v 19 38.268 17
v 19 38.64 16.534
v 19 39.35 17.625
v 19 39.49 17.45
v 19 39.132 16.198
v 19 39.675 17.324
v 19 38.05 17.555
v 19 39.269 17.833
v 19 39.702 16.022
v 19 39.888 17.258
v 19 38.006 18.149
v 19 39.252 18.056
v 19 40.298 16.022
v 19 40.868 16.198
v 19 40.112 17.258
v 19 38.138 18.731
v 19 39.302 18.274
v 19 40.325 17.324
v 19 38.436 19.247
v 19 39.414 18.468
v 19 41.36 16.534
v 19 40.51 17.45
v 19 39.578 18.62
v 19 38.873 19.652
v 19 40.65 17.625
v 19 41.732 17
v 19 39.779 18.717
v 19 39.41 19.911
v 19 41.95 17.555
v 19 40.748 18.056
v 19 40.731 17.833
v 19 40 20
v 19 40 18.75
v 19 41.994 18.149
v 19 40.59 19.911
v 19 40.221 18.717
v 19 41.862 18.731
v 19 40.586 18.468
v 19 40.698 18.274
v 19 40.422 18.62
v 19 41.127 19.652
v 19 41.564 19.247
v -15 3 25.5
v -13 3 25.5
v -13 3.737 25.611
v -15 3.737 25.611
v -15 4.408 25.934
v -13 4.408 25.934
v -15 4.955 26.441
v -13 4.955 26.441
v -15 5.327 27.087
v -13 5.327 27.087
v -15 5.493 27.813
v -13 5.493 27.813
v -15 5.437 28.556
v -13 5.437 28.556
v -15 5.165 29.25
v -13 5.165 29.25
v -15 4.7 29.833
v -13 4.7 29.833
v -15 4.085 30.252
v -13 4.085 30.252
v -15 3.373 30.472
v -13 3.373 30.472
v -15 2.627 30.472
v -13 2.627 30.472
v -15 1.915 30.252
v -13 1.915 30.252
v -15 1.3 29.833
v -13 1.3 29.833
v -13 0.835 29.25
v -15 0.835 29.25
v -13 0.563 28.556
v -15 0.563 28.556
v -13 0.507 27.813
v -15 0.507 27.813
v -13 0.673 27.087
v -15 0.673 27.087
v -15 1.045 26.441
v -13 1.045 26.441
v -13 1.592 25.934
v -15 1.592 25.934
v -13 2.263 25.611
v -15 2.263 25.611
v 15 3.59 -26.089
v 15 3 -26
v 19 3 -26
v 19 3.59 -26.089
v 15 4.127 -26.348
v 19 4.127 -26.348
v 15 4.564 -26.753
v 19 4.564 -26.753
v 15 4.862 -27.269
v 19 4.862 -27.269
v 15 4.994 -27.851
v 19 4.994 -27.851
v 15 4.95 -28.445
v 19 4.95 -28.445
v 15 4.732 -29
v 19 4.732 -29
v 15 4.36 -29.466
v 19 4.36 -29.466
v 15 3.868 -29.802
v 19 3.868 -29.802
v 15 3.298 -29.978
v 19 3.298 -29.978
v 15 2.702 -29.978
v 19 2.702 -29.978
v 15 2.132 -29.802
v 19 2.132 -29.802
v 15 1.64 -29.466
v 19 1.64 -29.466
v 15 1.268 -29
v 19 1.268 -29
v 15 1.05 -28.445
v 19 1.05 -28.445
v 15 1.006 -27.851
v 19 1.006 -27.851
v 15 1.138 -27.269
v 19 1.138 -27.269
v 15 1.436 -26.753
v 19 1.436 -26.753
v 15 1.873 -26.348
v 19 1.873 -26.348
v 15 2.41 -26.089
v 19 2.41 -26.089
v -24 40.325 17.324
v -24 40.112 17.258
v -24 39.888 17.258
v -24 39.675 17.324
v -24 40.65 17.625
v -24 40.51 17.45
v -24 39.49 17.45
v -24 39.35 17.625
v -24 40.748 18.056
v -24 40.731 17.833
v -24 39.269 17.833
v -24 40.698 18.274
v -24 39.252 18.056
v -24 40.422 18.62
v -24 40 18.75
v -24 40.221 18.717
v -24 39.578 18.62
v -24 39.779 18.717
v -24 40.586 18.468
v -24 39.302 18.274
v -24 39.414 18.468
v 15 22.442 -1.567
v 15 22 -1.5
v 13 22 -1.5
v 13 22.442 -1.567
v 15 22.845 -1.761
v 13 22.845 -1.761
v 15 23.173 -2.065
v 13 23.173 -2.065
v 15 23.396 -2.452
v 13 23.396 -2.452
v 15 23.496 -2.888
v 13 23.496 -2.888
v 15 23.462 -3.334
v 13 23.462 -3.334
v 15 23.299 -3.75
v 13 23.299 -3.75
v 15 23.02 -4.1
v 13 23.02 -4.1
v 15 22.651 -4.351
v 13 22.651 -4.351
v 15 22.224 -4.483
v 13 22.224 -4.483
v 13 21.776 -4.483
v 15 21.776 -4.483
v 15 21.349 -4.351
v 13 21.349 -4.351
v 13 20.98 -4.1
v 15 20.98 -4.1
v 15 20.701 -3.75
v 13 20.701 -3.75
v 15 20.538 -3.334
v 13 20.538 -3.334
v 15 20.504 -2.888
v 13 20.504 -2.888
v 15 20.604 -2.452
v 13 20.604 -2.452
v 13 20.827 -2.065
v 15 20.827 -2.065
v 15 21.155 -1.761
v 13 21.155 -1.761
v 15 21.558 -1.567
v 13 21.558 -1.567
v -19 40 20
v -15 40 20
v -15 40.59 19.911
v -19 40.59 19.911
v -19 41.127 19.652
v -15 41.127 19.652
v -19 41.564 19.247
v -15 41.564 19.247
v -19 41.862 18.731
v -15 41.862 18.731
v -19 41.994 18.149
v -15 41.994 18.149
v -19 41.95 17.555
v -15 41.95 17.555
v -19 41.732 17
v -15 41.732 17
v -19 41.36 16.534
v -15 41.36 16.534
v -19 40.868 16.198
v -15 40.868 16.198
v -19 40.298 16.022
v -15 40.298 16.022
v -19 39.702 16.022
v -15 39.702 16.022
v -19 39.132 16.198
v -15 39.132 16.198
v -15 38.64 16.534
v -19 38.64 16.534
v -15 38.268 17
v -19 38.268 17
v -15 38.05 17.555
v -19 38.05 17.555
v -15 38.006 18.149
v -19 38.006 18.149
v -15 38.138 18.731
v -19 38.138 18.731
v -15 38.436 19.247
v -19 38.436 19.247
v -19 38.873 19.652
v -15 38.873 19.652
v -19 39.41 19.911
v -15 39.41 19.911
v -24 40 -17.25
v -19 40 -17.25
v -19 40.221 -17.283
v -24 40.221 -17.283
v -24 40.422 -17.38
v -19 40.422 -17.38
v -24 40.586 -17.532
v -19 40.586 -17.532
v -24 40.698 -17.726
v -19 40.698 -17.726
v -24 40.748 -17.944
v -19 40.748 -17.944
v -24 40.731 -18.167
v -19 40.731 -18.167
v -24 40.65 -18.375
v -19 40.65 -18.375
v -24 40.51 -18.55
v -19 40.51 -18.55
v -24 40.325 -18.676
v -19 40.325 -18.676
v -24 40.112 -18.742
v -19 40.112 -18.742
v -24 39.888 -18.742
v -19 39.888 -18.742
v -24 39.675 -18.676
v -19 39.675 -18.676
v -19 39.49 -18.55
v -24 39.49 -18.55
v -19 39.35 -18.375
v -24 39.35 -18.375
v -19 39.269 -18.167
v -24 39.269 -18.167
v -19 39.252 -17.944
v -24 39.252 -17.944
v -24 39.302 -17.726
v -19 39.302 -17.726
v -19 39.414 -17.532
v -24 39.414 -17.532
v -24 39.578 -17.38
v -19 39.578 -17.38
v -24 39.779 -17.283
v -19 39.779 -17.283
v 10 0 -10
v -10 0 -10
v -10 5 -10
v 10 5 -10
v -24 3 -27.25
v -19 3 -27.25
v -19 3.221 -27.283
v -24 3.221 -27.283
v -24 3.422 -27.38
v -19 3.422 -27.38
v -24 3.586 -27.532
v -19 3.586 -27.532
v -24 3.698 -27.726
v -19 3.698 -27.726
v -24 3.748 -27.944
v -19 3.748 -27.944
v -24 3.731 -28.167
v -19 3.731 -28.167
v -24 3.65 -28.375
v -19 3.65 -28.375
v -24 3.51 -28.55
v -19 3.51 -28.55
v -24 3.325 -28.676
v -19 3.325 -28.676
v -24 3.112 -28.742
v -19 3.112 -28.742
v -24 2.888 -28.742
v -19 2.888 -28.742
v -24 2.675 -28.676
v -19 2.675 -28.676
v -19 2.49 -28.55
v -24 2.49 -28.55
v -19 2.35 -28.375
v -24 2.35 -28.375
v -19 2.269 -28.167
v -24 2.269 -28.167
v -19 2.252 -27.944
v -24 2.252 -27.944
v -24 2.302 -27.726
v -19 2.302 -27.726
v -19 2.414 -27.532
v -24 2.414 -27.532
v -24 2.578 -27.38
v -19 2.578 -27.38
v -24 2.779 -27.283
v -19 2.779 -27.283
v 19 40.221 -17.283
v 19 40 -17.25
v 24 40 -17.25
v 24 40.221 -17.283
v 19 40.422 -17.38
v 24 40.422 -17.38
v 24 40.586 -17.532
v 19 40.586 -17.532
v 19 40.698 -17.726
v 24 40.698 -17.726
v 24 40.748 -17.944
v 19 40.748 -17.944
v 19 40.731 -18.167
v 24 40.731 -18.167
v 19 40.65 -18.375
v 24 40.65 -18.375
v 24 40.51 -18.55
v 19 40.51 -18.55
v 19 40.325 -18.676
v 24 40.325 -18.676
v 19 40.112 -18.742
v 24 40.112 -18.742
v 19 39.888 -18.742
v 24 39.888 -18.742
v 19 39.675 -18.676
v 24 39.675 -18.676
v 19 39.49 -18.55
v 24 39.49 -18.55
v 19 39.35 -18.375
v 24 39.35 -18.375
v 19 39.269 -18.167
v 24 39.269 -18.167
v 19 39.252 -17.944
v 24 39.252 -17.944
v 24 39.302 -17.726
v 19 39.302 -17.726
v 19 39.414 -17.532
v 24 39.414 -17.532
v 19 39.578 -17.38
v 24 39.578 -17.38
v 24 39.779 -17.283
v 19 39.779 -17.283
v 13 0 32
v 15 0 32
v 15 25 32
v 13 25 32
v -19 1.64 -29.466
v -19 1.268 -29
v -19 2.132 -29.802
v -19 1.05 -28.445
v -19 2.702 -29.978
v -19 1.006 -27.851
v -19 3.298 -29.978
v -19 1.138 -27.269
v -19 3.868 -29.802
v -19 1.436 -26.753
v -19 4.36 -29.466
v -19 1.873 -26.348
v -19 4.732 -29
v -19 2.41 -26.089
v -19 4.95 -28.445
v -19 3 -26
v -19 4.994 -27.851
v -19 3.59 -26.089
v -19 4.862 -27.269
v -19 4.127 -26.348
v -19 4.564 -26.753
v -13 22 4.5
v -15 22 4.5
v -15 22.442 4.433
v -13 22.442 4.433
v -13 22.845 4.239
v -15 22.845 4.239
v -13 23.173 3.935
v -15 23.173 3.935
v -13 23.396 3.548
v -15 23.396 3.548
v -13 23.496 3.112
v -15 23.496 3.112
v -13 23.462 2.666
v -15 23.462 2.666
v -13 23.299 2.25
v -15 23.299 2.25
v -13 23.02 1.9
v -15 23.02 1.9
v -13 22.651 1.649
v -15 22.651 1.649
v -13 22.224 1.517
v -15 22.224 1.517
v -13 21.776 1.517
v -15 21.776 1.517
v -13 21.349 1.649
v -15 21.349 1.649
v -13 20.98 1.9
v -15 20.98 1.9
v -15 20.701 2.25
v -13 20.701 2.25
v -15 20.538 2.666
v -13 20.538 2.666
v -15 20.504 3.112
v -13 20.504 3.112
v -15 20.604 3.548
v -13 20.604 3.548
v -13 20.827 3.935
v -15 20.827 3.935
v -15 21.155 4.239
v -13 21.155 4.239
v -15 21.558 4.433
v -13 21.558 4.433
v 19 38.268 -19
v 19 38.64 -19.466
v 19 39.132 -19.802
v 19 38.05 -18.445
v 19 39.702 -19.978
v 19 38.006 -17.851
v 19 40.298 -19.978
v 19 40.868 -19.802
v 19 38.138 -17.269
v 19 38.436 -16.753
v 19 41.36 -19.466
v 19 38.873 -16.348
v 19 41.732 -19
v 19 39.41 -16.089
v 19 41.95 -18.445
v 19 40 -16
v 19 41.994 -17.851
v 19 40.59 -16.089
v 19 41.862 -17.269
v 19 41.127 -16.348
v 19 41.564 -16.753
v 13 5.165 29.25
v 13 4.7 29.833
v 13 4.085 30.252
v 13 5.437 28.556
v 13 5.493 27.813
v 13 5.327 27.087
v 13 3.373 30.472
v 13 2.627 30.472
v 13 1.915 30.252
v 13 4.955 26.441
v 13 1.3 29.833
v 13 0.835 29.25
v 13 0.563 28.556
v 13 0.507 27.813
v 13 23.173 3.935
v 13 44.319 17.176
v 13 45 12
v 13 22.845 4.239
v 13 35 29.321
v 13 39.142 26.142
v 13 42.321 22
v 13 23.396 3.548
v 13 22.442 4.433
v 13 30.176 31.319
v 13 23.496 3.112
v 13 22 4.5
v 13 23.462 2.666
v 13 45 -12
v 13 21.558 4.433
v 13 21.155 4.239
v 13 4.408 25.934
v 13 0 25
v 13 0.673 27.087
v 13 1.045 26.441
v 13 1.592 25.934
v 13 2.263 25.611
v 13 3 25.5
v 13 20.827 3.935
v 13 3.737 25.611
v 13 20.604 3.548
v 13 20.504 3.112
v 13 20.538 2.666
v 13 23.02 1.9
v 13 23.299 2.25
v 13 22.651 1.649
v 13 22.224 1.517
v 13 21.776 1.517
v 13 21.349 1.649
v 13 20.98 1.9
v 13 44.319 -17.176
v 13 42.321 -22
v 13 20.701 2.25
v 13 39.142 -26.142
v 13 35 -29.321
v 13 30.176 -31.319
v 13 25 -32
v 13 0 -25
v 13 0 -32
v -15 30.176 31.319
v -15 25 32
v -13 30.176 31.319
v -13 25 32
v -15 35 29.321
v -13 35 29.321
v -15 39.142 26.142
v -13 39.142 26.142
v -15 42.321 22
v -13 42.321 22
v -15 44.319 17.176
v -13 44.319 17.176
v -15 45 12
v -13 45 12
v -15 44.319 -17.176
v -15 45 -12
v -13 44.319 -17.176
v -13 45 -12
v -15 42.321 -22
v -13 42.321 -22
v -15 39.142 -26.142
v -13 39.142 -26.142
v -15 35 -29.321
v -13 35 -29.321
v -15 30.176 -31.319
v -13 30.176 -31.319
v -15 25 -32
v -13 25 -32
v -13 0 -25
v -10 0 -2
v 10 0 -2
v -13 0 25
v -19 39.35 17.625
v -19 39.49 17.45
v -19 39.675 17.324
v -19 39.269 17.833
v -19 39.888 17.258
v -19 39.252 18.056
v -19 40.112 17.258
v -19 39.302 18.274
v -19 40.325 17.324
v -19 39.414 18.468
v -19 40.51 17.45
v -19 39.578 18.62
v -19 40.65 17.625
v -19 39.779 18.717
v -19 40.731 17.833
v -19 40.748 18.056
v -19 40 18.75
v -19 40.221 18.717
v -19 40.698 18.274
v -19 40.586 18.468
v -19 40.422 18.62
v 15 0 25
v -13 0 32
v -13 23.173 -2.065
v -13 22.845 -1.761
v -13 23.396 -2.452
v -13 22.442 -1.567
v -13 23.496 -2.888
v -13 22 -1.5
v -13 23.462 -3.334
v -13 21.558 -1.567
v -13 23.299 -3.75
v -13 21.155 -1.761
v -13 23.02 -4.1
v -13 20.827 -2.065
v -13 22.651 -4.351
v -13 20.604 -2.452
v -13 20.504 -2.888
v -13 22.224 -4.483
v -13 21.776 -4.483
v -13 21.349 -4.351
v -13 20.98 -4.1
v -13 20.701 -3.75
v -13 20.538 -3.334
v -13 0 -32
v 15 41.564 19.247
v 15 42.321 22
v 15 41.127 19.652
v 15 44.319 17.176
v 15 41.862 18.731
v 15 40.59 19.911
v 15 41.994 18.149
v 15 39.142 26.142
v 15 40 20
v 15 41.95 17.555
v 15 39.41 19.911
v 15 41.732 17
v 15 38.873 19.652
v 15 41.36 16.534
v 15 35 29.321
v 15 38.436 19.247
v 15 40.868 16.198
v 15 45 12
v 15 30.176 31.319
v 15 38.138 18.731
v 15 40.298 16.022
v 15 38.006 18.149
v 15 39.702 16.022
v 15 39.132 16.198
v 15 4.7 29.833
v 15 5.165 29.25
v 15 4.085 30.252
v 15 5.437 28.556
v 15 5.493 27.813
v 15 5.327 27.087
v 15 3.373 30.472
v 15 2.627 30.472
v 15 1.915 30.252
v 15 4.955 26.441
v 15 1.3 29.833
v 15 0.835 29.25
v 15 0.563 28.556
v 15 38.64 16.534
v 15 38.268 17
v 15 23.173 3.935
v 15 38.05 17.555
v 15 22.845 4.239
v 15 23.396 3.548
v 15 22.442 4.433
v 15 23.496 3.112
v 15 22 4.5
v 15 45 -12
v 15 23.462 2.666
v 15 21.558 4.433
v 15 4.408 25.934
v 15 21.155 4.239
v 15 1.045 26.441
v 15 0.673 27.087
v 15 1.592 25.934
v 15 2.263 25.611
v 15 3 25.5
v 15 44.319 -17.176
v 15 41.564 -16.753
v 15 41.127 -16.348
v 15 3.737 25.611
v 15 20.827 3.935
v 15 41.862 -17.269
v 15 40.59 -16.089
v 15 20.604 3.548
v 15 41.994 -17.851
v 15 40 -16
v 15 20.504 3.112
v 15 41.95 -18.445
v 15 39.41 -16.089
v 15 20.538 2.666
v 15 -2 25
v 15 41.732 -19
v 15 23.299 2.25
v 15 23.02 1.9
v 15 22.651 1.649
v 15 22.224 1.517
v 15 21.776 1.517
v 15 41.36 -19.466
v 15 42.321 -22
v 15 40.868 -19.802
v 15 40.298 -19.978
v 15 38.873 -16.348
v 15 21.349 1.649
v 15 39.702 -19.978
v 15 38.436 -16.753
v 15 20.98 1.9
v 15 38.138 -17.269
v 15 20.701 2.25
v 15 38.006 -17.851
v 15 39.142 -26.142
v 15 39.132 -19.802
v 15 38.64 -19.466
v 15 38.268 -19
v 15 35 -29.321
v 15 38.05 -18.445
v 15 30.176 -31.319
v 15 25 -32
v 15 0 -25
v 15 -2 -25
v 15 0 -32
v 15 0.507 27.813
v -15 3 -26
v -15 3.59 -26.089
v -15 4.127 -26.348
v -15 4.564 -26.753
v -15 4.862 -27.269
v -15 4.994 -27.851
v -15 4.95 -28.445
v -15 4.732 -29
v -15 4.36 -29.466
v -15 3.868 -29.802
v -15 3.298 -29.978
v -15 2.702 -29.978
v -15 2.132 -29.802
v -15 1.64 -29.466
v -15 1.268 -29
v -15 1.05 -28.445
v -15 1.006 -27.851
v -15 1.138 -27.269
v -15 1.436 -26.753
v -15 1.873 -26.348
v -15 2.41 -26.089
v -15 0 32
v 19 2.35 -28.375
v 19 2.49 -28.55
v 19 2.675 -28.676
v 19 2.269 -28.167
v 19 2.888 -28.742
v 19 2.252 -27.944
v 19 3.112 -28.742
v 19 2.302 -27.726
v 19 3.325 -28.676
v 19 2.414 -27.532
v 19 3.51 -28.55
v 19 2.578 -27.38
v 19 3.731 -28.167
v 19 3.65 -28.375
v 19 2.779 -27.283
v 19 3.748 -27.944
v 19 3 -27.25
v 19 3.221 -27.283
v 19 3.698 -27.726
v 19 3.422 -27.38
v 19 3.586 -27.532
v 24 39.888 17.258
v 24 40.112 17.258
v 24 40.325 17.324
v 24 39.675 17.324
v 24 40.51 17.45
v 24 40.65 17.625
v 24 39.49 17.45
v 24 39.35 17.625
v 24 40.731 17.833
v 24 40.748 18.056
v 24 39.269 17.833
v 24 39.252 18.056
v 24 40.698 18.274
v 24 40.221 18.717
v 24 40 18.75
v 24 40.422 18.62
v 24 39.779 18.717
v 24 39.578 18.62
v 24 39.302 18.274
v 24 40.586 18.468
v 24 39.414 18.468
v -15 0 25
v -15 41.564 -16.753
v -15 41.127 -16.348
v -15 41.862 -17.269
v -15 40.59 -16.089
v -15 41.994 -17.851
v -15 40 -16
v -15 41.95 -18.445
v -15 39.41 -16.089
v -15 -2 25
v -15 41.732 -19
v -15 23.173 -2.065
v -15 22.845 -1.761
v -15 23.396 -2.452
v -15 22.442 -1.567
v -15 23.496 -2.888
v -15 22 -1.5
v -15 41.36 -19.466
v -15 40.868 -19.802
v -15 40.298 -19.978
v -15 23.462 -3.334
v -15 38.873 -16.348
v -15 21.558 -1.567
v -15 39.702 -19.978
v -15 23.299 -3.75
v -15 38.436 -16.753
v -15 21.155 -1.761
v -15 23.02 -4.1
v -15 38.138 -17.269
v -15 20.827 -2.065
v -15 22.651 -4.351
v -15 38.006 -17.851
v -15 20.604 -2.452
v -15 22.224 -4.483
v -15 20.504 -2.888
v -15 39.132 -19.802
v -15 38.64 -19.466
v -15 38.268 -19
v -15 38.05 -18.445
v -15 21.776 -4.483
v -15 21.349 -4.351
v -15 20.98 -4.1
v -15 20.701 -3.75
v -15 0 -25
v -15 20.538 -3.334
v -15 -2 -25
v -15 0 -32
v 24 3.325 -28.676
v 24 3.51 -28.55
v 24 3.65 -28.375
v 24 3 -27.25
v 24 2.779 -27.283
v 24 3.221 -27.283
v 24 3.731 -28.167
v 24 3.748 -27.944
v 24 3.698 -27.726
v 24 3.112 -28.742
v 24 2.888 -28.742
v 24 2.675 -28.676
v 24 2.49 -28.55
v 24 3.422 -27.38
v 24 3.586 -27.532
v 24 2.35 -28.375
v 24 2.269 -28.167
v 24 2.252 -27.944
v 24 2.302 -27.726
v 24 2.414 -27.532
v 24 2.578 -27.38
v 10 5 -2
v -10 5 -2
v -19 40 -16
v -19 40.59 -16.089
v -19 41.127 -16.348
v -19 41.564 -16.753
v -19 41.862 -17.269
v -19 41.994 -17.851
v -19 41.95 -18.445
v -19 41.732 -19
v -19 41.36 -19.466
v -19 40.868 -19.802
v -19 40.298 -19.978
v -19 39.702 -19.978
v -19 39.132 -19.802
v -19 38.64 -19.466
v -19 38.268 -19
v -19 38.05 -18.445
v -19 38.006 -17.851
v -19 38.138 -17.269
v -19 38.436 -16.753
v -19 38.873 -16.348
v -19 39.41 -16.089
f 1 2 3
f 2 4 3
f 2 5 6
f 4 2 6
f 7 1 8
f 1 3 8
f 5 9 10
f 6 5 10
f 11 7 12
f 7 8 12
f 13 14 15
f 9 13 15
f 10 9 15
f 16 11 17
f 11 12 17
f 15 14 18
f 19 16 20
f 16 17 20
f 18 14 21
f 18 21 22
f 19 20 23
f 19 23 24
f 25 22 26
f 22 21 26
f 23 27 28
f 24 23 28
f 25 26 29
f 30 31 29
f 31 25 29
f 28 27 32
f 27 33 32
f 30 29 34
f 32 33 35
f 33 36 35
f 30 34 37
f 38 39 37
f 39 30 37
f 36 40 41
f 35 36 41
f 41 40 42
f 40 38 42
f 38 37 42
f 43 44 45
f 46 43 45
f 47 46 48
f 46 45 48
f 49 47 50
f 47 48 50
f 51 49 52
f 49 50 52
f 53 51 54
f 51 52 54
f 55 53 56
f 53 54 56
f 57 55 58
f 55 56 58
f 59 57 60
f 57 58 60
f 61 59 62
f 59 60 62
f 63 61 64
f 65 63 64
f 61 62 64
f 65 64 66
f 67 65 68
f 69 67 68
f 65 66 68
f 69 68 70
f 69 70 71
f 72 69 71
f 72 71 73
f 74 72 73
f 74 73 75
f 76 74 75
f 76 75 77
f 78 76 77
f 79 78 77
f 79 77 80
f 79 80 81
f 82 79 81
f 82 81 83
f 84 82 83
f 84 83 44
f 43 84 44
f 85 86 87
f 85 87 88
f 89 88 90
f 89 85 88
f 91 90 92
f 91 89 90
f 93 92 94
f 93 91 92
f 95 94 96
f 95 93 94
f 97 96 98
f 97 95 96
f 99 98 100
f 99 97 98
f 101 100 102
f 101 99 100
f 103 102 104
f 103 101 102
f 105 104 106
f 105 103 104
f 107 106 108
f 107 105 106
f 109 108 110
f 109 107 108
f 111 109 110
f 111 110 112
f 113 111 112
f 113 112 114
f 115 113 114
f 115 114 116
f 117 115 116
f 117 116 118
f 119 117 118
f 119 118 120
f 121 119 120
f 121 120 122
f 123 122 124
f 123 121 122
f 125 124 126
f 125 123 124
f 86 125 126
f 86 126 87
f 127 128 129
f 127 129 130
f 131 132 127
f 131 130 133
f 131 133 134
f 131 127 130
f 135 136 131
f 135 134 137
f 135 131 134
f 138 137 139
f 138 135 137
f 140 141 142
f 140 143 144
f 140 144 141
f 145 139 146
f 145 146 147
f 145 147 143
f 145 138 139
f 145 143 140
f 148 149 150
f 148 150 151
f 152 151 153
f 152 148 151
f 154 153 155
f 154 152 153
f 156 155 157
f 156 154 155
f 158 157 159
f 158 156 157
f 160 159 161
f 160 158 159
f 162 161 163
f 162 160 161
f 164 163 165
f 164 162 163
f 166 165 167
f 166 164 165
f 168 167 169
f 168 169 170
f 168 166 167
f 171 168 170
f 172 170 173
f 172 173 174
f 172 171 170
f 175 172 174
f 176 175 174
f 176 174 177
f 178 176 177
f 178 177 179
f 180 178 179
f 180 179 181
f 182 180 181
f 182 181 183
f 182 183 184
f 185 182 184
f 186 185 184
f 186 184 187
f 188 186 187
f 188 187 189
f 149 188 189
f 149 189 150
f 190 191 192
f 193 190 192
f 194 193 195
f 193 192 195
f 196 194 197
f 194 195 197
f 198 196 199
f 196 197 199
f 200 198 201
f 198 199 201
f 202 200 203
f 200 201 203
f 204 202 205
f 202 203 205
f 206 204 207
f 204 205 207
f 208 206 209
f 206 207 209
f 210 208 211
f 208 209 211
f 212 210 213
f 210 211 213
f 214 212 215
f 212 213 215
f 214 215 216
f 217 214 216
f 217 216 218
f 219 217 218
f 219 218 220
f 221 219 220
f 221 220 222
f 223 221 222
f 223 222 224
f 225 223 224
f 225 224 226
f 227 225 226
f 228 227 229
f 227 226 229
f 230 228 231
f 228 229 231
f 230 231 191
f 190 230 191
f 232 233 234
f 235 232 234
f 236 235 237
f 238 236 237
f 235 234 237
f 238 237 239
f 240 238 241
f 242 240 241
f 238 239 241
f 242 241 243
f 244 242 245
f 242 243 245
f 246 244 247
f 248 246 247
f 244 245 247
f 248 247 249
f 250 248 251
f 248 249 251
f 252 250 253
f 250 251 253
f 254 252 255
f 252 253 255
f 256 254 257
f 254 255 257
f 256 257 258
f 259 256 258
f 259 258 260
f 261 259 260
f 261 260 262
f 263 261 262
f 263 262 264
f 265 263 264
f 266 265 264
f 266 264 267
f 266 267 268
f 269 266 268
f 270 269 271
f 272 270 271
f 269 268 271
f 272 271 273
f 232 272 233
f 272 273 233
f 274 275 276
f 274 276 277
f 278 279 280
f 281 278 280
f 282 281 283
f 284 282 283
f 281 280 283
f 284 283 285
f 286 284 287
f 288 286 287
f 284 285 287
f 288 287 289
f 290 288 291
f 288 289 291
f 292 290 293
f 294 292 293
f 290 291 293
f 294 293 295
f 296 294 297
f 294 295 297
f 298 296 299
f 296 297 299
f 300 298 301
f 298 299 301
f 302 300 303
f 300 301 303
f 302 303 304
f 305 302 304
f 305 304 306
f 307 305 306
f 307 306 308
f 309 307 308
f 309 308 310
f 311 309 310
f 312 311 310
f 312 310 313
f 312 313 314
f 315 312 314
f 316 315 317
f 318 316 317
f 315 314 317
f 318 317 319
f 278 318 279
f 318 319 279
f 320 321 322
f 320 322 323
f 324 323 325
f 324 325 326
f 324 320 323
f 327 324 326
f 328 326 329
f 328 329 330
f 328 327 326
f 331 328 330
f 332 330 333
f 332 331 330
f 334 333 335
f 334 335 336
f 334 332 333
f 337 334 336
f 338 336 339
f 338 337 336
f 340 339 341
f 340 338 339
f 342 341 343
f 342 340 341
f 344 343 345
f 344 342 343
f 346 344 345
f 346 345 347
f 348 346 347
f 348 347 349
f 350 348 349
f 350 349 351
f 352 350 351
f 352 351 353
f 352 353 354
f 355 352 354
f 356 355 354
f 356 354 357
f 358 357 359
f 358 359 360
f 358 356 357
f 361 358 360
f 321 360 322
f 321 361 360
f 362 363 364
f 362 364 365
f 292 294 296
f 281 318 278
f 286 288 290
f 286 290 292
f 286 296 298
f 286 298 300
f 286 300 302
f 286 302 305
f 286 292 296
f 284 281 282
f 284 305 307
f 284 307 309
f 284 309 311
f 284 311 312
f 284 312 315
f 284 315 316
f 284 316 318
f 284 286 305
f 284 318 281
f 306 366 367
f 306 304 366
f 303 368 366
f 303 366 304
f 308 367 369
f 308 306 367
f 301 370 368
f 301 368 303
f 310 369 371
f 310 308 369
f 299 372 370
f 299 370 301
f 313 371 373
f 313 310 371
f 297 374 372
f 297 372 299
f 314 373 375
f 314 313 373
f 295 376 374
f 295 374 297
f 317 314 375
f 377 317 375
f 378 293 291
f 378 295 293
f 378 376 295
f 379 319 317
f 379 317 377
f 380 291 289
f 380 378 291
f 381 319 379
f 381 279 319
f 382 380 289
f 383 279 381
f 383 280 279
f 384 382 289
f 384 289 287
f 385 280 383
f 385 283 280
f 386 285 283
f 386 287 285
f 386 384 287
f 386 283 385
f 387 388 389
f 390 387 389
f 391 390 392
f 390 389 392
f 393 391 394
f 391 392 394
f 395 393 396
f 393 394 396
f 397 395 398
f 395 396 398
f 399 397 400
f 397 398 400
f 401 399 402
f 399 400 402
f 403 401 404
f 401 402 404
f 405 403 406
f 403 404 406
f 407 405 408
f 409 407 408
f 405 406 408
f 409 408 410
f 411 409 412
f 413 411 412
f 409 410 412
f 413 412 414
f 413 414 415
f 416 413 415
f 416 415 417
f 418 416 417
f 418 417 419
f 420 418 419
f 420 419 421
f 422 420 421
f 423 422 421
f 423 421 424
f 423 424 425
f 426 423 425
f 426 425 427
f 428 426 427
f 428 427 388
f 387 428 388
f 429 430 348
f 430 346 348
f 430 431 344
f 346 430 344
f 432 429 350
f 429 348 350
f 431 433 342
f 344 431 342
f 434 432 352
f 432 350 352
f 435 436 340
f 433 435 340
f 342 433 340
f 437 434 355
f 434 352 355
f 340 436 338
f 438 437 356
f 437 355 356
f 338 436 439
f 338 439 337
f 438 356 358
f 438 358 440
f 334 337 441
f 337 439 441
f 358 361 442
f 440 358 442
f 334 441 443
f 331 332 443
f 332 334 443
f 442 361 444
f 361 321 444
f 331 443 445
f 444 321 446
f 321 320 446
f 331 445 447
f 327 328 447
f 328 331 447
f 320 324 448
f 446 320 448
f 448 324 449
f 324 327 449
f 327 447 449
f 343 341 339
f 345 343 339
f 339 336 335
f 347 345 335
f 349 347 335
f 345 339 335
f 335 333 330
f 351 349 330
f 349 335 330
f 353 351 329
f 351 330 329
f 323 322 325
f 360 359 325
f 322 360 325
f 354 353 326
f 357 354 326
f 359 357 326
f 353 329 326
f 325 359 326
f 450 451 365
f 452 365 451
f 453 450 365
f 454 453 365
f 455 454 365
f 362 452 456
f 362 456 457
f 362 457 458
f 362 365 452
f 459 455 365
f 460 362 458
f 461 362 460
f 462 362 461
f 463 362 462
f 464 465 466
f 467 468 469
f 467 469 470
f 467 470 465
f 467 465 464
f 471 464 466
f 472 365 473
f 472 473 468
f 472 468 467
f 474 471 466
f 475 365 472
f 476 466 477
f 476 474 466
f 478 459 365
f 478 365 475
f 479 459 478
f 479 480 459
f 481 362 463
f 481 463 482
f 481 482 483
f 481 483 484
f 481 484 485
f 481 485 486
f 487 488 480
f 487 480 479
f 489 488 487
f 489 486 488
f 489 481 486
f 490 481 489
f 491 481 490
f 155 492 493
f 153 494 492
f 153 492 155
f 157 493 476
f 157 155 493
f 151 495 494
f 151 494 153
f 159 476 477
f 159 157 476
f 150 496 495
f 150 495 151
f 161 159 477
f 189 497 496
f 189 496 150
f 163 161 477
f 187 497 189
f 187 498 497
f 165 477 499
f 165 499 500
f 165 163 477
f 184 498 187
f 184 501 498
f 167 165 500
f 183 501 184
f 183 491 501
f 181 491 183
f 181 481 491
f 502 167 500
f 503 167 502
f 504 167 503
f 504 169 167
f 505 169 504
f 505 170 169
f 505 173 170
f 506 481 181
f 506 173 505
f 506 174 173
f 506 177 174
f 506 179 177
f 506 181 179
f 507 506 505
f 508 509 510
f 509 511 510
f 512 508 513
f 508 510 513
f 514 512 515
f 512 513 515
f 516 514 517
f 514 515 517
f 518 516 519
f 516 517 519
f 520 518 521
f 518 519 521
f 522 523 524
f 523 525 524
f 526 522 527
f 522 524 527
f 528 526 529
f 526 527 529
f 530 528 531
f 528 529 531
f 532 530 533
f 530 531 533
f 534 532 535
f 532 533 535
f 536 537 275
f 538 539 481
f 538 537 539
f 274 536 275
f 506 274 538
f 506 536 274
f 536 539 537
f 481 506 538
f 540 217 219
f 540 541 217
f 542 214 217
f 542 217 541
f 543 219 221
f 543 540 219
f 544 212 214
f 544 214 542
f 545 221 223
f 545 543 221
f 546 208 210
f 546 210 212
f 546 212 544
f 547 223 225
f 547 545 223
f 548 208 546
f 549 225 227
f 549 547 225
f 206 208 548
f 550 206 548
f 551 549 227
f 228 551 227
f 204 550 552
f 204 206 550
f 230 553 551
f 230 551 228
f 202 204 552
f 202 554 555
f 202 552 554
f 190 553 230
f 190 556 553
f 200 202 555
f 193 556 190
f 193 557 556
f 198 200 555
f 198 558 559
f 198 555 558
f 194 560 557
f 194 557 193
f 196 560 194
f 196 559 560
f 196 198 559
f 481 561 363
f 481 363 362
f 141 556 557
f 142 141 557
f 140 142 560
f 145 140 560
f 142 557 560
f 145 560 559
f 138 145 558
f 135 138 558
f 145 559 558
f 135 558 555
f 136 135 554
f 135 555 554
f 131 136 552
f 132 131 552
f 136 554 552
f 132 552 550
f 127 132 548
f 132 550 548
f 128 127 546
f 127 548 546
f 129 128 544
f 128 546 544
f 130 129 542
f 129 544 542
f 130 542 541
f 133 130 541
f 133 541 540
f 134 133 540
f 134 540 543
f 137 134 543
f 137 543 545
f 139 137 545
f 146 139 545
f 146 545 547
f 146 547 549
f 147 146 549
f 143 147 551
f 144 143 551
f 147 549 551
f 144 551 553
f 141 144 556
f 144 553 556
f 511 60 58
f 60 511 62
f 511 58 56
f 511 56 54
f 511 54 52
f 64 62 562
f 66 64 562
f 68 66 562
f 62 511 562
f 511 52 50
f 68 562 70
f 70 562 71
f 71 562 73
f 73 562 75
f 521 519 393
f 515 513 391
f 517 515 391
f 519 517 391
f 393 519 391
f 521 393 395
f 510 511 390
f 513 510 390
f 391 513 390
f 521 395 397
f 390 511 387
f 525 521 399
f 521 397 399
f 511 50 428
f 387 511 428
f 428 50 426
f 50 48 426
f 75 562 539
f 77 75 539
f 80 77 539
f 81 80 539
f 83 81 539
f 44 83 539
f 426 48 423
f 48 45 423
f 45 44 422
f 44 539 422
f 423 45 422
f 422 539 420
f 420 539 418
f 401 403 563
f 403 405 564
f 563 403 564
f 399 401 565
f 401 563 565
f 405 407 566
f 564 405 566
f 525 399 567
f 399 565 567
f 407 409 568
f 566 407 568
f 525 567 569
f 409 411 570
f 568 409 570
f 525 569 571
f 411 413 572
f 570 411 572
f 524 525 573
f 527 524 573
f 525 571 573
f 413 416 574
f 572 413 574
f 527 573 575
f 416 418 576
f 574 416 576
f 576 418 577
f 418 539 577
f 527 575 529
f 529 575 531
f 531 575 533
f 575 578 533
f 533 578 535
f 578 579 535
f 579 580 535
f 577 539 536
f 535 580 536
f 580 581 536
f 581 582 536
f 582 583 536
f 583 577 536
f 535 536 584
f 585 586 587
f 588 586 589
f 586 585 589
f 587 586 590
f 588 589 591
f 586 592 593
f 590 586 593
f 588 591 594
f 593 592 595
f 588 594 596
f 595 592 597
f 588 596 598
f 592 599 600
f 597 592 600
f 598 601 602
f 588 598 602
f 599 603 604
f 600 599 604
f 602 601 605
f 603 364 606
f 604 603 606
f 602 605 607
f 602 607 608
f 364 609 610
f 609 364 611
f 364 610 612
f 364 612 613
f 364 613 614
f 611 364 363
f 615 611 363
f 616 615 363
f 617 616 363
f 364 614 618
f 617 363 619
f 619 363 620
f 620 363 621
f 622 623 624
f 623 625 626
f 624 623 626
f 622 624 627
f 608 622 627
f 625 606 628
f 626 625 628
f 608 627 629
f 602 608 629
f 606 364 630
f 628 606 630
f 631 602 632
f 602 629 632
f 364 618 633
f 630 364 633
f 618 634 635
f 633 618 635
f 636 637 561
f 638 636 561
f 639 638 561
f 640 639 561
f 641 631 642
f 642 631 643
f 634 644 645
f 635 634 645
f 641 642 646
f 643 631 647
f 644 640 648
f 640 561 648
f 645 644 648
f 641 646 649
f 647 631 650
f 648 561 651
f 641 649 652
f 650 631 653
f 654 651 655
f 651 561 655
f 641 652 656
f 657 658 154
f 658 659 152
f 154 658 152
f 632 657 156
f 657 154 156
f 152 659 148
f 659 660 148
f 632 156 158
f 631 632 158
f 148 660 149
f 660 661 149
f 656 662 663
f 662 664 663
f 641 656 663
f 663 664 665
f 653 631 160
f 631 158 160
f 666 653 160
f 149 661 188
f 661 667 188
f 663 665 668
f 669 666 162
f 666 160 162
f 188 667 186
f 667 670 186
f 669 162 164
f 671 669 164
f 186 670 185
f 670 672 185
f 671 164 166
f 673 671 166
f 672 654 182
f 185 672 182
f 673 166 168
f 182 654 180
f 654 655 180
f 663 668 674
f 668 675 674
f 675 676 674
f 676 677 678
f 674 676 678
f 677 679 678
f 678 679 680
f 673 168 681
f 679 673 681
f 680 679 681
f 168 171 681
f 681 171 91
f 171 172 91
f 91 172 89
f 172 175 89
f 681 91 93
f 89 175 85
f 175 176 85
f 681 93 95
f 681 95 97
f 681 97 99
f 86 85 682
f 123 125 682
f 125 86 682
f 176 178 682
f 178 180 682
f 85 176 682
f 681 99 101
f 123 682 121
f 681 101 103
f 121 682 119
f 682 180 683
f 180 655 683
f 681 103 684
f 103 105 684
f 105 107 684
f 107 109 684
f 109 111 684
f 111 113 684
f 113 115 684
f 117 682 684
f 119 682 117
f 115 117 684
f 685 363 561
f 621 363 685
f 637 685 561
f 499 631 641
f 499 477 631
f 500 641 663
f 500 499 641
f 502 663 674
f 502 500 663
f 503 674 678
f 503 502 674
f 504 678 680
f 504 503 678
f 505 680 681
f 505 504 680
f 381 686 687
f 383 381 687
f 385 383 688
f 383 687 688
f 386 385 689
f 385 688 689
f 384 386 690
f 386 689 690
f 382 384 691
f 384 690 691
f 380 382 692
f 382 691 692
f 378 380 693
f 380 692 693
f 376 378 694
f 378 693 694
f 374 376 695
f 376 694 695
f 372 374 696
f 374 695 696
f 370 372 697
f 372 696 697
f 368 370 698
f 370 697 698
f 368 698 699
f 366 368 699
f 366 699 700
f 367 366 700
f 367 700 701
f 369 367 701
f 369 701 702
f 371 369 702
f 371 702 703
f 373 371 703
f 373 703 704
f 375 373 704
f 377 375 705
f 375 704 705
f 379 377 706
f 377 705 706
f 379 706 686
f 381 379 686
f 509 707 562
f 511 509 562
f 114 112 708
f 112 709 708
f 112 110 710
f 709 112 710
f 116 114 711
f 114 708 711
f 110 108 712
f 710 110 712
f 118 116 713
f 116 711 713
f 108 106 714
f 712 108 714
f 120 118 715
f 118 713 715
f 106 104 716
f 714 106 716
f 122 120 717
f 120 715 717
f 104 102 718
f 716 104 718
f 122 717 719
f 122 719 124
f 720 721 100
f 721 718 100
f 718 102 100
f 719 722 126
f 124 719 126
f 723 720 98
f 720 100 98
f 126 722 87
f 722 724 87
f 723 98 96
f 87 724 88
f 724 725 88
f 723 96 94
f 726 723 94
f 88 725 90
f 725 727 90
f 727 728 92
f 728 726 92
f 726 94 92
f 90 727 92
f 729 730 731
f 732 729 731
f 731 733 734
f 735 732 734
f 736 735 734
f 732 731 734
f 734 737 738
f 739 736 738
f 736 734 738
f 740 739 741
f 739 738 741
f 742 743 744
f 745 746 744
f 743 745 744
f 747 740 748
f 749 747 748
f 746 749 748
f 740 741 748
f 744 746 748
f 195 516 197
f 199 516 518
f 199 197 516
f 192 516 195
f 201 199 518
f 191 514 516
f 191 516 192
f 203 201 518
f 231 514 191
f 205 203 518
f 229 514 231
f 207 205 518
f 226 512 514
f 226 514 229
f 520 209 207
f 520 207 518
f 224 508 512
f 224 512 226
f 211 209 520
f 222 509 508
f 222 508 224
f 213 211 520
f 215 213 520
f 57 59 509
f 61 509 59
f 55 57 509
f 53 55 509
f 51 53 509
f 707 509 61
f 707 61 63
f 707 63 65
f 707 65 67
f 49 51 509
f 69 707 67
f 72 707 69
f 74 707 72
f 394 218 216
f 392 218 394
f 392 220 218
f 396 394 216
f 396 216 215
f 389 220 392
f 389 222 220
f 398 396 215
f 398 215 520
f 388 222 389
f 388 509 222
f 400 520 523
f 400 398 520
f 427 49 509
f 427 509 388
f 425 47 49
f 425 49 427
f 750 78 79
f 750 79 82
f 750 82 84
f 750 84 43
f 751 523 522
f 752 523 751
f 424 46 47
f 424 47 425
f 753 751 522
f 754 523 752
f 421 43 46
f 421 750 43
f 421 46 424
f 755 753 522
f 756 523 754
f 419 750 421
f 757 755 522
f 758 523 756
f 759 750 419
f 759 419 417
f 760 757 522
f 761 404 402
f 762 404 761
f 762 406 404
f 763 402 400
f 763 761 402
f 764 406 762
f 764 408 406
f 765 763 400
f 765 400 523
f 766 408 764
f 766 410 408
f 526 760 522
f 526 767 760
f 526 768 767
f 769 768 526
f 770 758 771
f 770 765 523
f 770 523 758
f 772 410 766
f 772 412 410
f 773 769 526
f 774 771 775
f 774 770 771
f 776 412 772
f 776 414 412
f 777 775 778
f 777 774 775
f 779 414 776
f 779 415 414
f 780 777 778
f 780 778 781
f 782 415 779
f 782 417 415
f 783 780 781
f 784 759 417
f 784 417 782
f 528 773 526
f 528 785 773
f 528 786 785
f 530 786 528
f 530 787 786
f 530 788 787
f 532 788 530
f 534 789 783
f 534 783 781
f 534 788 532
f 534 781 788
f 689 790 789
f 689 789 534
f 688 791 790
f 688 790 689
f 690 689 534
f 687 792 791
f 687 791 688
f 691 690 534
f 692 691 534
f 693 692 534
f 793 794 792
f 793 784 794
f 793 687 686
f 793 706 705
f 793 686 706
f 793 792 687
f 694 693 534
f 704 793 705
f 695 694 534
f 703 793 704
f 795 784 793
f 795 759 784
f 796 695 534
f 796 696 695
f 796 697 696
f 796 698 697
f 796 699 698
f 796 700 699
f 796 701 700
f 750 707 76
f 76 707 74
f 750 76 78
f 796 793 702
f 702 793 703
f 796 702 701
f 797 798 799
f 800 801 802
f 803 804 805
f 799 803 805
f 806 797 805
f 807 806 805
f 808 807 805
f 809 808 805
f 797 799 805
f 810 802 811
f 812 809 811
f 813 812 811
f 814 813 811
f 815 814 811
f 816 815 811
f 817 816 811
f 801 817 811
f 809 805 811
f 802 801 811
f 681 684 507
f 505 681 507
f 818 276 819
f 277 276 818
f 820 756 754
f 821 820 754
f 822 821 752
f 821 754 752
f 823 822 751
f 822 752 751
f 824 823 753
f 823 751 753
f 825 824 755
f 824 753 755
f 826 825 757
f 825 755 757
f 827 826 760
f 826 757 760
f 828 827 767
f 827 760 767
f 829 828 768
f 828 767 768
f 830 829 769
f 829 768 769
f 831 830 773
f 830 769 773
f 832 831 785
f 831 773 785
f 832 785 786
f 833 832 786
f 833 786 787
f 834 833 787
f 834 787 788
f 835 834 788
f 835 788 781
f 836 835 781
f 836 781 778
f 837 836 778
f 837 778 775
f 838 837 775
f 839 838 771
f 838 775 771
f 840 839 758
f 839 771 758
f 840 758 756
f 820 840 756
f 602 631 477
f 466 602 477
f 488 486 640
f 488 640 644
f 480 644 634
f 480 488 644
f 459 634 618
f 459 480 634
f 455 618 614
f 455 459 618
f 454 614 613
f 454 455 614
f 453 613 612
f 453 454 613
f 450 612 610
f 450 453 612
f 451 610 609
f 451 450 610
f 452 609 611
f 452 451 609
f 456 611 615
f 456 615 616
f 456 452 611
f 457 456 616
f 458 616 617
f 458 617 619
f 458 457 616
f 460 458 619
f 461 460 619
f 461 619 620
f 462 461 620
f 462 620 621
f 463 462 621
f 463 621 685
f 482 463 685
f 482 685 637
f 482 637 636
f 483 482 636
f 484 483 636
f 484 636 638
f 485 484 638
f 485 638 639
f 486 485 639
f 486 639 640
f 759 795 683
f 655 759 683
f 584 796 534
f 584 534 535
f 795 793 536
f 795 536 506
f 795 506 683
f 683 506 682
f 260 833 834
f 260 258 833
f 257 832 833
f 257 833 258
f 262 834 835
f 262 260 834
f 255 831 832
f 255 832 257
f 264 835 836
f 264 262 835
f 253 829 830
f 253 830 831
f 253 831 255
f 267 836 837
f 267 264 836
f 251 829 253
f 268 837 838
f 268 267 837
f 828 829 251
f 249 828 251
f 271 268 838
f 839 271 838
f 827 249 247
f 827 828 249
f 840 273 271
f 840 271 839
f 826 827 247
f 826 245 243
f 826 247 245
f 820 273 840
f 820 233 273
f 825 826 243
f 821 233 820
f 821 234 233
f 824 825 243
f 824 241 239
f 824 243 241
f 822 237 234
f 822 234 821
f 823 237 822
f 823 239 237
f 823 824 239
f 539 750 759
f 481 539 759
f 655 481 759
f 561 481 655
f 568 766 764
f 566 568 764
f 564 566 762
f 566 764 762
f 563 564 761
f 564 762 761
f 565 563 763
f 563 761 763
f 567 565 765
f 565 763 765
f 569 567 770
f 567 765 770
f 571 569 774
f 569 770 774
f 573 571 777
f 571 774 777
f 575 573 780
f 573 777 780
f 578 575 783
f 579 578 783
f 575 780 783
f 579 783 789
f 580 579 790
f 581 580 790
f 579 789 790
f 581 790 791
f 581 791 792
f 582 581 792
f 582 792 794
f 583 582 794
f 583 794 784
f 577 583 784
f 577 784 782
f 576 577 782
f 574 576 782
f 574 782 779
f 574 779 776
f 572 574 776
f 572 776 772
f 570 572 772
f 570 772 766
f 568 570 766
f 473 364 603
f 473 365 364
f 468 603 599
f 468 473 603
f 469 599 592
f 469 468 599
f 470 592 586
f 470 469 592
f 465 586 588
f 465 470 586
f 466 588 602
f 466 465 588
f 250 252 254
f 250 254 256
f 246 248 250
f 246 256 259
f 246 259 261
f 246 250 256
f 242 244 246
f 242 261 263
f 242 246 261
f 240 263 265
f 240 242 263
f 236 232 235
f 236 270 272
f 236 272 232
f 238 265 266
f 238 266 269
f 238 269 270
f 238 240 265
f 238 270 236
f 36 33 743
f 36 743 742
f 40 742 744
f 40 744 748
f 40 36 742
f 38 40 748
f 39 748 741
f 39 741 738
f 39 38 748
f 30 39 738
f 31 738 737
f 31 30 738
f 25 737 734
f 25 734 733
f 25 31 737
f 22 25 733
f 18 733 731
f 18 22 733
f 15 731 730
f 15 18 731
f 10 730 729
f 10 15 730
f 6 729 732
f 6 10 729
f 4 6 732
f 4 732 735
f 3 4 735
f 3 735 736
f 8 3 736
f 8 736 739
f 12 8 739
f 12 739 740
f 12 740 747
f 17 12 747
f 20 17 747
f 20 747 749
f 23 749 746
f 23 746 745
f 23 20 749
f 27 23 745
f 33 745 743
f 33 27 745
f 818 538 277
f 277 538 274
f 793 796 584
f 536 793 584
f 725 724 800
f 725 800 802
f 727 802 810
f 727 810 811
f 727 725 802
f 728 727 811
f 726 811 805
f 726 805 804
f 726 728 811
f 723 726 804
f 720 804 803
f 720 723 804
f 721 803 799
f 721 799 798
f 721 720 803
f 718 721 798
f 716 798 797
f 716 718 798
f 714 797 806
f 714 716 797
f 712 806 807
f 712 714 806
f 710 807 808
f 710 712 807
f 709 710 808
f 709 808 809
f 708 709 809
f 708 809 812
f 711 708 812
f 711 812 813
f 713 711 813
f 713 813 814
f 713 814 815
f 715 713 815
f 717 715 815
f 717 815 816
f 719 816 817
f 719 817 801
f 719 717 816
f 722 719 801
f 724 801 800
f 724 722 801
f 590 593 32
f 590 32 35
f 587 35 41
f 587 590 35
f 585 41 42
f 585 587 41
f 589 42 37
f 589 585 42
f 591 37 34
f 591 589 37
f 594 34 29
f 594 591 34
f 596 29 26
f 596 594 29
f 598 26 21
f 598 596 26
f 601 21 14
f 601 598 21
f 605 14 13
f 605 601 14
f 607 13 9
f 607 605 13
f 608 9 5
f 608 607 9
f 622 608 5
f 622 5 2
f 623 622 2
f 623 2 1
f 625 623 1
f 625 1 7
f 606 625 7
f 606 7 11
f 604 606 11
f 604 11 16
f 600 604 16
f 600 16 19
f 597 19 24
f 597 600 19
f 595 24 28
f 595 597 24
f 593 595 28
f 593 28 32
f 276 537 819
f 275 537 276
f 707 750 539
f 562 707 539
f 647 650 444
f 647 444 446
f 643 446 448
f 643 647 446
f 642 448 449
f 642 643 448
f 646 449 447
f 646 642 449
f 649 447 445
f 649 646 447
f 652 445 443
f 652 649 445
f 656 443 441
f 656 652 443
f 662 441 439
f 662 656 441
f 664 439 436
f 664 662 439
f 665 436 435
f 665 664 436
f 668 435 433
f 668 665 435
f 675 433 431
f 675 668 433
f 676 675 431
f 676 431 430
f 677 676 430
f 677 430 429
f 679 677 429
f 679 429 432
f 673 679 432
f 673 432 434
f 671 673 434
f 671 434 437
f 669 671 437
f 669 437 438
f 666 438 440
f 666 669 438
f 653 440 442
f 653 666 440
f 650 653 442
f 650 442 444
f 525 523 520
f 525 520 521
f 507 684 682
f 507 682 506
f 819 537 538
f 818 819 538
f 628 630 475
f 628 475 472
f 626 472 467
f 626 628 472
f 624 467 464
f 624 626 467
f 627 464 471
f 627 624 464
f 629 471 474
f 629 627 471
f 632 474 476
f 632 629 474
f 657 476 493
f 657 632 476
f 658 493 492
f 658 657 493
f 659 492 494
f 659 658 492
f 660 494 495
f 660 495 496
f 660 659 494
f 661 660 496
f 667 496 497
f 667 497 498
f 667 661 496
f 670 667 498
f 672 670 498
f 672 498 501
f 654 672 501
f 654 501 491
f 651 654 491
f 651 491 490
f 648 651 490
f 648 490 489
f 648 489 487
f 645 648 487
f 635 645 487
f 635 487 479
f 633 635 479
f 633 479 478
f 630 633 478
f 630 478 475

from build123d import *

# Parameters (mm, degrees)
SKETCH_1_W          = 30
SKETCH_1_H          = 50
EXTRUDE_1_DEPTH     = 2
SKETCH_3_W          = 2
SKETCH_3_H          = 64
EXTRUDE_2_DEPTH     = 45
SKETCH_6_R          = 2.5
CUT_EXTRUDE_1_DEPTH = 3
SKETCH_7_R          = 2
EXTRUDE_4_DEPTH     = 4
SKETCH_8_R          = 0.75
EXTRUDE_5_DEPTH     = 5
FILLET_1_R          = 20
SKETCH_9_R          = 1.5
CUT_EXTRUDE_2_DEPTH = 31
SKETCH_10_W         = 20
SKETCH_10_H         = 8
EXTRUDE_6_DEPTH     = 5


with BuildPart() as part:
    # 草图1 → 凸台-拉伸1 (new body)
    with BuildSketch(Plane(origin=(0, 0, 0), x_dir=(1, 0, 0), z_dir=(0, 1, 0))):
        Rectangle(SKETCH_1_W, SKETCH_1_H)
    extrude(amount=-EXTRUDE_1_DEPTH)

    # 草图3 → 凸台-拉伸2 (add)
    with BuildSketch(Plane(origin=(0, 0, 0), x_dir=(1, 0, 0), z_dir=(0, 1, 0))):
        with Locations((-14, 0)):
            Rectangle(SKETCH_3_W, SKETCH_3_H)
    extrude(amount=EXTRUDE_2_DEPTH)

    # 草图6 → 切除-拉伸1 (cut, through all)
    with BuildSketch(Plane(origin=(-13, 0, 0), x_dir=(0, 0, -1), z_dir=(1, 0, 0))):
        with Locations((-28, 3)):
            Circle(SKETCH_6_R)
    extrude(amount=-CUT_EXTRUDE_1_DEPTH, mode=Mode.SUBTRACT)

    # 草图7 → 凸台-拉伸4 (add)
    with BuildSketch(Plane.ZY.offset(15)):
        with Locations((-18, 40)):
            Circle(SKETCH_7_R)
        with Locations((18, 40)):
            Circle(SKETCH_7_R)
        with Locations((-28, 3)):
            Circle(SKETCH_7_R)
    extrude(amount=EXTRUDE_4_DEPTH)

    # 草图8 → 凸台-拉伸5 (add)
    with BuildSketch(Plane.ZY.offset(19)):
        with Locations((-18, 40)):
            Circle(SKETCH_8_R)
        with Locations((18, 40)):
            Circle(SKETCH_8_R)
        with Locations((-28, 3)):
            Circle(SKETCH_8_R)
    extrude(amount=EXTRUDE_5_DEPTH)

    # 圆角1
    fillet_1_edges = [part.edges().sort_by_distance(p)[0] for p in [
        (-14, 45, 32),
        (-14, 45, -32),
    ]]
    fillet(fillet_1_edges, radius=FILLET_1_R)

    # 草图9 → 切除-拉伸2 (cut, through all)
    with BuildSketch(Plane.ZY.offset(15)):
        with Locations((-3, 22)):
            Circle(SKETCH_9_R)
        with Locations((3, 22)):
            Circle(SKETCH_9_R)
    extrude(amount=-CUT_EXTRUDE_2_DEPTH, mode=Mode.SUBTRACT)

    # 镜向1: part across plane


with BuildPart() as part_1:
    add(part.part)
    add(part.part.mirror(Plane.ZY))

    # 草图10 → 凸台-拉伸6 (add)
    with BuildSketch(Plane(origin=(0, 0, 0), x_dir=(1, 0, 0), z_dir=(0, 1, 0))):
        with Locations((0, 6)):
            Rectangle(SKETCH_10_W, SKETCH_10_H)
    extrude(amount=EXTRUDE_6_DEPTH)


solid = part_1.part
